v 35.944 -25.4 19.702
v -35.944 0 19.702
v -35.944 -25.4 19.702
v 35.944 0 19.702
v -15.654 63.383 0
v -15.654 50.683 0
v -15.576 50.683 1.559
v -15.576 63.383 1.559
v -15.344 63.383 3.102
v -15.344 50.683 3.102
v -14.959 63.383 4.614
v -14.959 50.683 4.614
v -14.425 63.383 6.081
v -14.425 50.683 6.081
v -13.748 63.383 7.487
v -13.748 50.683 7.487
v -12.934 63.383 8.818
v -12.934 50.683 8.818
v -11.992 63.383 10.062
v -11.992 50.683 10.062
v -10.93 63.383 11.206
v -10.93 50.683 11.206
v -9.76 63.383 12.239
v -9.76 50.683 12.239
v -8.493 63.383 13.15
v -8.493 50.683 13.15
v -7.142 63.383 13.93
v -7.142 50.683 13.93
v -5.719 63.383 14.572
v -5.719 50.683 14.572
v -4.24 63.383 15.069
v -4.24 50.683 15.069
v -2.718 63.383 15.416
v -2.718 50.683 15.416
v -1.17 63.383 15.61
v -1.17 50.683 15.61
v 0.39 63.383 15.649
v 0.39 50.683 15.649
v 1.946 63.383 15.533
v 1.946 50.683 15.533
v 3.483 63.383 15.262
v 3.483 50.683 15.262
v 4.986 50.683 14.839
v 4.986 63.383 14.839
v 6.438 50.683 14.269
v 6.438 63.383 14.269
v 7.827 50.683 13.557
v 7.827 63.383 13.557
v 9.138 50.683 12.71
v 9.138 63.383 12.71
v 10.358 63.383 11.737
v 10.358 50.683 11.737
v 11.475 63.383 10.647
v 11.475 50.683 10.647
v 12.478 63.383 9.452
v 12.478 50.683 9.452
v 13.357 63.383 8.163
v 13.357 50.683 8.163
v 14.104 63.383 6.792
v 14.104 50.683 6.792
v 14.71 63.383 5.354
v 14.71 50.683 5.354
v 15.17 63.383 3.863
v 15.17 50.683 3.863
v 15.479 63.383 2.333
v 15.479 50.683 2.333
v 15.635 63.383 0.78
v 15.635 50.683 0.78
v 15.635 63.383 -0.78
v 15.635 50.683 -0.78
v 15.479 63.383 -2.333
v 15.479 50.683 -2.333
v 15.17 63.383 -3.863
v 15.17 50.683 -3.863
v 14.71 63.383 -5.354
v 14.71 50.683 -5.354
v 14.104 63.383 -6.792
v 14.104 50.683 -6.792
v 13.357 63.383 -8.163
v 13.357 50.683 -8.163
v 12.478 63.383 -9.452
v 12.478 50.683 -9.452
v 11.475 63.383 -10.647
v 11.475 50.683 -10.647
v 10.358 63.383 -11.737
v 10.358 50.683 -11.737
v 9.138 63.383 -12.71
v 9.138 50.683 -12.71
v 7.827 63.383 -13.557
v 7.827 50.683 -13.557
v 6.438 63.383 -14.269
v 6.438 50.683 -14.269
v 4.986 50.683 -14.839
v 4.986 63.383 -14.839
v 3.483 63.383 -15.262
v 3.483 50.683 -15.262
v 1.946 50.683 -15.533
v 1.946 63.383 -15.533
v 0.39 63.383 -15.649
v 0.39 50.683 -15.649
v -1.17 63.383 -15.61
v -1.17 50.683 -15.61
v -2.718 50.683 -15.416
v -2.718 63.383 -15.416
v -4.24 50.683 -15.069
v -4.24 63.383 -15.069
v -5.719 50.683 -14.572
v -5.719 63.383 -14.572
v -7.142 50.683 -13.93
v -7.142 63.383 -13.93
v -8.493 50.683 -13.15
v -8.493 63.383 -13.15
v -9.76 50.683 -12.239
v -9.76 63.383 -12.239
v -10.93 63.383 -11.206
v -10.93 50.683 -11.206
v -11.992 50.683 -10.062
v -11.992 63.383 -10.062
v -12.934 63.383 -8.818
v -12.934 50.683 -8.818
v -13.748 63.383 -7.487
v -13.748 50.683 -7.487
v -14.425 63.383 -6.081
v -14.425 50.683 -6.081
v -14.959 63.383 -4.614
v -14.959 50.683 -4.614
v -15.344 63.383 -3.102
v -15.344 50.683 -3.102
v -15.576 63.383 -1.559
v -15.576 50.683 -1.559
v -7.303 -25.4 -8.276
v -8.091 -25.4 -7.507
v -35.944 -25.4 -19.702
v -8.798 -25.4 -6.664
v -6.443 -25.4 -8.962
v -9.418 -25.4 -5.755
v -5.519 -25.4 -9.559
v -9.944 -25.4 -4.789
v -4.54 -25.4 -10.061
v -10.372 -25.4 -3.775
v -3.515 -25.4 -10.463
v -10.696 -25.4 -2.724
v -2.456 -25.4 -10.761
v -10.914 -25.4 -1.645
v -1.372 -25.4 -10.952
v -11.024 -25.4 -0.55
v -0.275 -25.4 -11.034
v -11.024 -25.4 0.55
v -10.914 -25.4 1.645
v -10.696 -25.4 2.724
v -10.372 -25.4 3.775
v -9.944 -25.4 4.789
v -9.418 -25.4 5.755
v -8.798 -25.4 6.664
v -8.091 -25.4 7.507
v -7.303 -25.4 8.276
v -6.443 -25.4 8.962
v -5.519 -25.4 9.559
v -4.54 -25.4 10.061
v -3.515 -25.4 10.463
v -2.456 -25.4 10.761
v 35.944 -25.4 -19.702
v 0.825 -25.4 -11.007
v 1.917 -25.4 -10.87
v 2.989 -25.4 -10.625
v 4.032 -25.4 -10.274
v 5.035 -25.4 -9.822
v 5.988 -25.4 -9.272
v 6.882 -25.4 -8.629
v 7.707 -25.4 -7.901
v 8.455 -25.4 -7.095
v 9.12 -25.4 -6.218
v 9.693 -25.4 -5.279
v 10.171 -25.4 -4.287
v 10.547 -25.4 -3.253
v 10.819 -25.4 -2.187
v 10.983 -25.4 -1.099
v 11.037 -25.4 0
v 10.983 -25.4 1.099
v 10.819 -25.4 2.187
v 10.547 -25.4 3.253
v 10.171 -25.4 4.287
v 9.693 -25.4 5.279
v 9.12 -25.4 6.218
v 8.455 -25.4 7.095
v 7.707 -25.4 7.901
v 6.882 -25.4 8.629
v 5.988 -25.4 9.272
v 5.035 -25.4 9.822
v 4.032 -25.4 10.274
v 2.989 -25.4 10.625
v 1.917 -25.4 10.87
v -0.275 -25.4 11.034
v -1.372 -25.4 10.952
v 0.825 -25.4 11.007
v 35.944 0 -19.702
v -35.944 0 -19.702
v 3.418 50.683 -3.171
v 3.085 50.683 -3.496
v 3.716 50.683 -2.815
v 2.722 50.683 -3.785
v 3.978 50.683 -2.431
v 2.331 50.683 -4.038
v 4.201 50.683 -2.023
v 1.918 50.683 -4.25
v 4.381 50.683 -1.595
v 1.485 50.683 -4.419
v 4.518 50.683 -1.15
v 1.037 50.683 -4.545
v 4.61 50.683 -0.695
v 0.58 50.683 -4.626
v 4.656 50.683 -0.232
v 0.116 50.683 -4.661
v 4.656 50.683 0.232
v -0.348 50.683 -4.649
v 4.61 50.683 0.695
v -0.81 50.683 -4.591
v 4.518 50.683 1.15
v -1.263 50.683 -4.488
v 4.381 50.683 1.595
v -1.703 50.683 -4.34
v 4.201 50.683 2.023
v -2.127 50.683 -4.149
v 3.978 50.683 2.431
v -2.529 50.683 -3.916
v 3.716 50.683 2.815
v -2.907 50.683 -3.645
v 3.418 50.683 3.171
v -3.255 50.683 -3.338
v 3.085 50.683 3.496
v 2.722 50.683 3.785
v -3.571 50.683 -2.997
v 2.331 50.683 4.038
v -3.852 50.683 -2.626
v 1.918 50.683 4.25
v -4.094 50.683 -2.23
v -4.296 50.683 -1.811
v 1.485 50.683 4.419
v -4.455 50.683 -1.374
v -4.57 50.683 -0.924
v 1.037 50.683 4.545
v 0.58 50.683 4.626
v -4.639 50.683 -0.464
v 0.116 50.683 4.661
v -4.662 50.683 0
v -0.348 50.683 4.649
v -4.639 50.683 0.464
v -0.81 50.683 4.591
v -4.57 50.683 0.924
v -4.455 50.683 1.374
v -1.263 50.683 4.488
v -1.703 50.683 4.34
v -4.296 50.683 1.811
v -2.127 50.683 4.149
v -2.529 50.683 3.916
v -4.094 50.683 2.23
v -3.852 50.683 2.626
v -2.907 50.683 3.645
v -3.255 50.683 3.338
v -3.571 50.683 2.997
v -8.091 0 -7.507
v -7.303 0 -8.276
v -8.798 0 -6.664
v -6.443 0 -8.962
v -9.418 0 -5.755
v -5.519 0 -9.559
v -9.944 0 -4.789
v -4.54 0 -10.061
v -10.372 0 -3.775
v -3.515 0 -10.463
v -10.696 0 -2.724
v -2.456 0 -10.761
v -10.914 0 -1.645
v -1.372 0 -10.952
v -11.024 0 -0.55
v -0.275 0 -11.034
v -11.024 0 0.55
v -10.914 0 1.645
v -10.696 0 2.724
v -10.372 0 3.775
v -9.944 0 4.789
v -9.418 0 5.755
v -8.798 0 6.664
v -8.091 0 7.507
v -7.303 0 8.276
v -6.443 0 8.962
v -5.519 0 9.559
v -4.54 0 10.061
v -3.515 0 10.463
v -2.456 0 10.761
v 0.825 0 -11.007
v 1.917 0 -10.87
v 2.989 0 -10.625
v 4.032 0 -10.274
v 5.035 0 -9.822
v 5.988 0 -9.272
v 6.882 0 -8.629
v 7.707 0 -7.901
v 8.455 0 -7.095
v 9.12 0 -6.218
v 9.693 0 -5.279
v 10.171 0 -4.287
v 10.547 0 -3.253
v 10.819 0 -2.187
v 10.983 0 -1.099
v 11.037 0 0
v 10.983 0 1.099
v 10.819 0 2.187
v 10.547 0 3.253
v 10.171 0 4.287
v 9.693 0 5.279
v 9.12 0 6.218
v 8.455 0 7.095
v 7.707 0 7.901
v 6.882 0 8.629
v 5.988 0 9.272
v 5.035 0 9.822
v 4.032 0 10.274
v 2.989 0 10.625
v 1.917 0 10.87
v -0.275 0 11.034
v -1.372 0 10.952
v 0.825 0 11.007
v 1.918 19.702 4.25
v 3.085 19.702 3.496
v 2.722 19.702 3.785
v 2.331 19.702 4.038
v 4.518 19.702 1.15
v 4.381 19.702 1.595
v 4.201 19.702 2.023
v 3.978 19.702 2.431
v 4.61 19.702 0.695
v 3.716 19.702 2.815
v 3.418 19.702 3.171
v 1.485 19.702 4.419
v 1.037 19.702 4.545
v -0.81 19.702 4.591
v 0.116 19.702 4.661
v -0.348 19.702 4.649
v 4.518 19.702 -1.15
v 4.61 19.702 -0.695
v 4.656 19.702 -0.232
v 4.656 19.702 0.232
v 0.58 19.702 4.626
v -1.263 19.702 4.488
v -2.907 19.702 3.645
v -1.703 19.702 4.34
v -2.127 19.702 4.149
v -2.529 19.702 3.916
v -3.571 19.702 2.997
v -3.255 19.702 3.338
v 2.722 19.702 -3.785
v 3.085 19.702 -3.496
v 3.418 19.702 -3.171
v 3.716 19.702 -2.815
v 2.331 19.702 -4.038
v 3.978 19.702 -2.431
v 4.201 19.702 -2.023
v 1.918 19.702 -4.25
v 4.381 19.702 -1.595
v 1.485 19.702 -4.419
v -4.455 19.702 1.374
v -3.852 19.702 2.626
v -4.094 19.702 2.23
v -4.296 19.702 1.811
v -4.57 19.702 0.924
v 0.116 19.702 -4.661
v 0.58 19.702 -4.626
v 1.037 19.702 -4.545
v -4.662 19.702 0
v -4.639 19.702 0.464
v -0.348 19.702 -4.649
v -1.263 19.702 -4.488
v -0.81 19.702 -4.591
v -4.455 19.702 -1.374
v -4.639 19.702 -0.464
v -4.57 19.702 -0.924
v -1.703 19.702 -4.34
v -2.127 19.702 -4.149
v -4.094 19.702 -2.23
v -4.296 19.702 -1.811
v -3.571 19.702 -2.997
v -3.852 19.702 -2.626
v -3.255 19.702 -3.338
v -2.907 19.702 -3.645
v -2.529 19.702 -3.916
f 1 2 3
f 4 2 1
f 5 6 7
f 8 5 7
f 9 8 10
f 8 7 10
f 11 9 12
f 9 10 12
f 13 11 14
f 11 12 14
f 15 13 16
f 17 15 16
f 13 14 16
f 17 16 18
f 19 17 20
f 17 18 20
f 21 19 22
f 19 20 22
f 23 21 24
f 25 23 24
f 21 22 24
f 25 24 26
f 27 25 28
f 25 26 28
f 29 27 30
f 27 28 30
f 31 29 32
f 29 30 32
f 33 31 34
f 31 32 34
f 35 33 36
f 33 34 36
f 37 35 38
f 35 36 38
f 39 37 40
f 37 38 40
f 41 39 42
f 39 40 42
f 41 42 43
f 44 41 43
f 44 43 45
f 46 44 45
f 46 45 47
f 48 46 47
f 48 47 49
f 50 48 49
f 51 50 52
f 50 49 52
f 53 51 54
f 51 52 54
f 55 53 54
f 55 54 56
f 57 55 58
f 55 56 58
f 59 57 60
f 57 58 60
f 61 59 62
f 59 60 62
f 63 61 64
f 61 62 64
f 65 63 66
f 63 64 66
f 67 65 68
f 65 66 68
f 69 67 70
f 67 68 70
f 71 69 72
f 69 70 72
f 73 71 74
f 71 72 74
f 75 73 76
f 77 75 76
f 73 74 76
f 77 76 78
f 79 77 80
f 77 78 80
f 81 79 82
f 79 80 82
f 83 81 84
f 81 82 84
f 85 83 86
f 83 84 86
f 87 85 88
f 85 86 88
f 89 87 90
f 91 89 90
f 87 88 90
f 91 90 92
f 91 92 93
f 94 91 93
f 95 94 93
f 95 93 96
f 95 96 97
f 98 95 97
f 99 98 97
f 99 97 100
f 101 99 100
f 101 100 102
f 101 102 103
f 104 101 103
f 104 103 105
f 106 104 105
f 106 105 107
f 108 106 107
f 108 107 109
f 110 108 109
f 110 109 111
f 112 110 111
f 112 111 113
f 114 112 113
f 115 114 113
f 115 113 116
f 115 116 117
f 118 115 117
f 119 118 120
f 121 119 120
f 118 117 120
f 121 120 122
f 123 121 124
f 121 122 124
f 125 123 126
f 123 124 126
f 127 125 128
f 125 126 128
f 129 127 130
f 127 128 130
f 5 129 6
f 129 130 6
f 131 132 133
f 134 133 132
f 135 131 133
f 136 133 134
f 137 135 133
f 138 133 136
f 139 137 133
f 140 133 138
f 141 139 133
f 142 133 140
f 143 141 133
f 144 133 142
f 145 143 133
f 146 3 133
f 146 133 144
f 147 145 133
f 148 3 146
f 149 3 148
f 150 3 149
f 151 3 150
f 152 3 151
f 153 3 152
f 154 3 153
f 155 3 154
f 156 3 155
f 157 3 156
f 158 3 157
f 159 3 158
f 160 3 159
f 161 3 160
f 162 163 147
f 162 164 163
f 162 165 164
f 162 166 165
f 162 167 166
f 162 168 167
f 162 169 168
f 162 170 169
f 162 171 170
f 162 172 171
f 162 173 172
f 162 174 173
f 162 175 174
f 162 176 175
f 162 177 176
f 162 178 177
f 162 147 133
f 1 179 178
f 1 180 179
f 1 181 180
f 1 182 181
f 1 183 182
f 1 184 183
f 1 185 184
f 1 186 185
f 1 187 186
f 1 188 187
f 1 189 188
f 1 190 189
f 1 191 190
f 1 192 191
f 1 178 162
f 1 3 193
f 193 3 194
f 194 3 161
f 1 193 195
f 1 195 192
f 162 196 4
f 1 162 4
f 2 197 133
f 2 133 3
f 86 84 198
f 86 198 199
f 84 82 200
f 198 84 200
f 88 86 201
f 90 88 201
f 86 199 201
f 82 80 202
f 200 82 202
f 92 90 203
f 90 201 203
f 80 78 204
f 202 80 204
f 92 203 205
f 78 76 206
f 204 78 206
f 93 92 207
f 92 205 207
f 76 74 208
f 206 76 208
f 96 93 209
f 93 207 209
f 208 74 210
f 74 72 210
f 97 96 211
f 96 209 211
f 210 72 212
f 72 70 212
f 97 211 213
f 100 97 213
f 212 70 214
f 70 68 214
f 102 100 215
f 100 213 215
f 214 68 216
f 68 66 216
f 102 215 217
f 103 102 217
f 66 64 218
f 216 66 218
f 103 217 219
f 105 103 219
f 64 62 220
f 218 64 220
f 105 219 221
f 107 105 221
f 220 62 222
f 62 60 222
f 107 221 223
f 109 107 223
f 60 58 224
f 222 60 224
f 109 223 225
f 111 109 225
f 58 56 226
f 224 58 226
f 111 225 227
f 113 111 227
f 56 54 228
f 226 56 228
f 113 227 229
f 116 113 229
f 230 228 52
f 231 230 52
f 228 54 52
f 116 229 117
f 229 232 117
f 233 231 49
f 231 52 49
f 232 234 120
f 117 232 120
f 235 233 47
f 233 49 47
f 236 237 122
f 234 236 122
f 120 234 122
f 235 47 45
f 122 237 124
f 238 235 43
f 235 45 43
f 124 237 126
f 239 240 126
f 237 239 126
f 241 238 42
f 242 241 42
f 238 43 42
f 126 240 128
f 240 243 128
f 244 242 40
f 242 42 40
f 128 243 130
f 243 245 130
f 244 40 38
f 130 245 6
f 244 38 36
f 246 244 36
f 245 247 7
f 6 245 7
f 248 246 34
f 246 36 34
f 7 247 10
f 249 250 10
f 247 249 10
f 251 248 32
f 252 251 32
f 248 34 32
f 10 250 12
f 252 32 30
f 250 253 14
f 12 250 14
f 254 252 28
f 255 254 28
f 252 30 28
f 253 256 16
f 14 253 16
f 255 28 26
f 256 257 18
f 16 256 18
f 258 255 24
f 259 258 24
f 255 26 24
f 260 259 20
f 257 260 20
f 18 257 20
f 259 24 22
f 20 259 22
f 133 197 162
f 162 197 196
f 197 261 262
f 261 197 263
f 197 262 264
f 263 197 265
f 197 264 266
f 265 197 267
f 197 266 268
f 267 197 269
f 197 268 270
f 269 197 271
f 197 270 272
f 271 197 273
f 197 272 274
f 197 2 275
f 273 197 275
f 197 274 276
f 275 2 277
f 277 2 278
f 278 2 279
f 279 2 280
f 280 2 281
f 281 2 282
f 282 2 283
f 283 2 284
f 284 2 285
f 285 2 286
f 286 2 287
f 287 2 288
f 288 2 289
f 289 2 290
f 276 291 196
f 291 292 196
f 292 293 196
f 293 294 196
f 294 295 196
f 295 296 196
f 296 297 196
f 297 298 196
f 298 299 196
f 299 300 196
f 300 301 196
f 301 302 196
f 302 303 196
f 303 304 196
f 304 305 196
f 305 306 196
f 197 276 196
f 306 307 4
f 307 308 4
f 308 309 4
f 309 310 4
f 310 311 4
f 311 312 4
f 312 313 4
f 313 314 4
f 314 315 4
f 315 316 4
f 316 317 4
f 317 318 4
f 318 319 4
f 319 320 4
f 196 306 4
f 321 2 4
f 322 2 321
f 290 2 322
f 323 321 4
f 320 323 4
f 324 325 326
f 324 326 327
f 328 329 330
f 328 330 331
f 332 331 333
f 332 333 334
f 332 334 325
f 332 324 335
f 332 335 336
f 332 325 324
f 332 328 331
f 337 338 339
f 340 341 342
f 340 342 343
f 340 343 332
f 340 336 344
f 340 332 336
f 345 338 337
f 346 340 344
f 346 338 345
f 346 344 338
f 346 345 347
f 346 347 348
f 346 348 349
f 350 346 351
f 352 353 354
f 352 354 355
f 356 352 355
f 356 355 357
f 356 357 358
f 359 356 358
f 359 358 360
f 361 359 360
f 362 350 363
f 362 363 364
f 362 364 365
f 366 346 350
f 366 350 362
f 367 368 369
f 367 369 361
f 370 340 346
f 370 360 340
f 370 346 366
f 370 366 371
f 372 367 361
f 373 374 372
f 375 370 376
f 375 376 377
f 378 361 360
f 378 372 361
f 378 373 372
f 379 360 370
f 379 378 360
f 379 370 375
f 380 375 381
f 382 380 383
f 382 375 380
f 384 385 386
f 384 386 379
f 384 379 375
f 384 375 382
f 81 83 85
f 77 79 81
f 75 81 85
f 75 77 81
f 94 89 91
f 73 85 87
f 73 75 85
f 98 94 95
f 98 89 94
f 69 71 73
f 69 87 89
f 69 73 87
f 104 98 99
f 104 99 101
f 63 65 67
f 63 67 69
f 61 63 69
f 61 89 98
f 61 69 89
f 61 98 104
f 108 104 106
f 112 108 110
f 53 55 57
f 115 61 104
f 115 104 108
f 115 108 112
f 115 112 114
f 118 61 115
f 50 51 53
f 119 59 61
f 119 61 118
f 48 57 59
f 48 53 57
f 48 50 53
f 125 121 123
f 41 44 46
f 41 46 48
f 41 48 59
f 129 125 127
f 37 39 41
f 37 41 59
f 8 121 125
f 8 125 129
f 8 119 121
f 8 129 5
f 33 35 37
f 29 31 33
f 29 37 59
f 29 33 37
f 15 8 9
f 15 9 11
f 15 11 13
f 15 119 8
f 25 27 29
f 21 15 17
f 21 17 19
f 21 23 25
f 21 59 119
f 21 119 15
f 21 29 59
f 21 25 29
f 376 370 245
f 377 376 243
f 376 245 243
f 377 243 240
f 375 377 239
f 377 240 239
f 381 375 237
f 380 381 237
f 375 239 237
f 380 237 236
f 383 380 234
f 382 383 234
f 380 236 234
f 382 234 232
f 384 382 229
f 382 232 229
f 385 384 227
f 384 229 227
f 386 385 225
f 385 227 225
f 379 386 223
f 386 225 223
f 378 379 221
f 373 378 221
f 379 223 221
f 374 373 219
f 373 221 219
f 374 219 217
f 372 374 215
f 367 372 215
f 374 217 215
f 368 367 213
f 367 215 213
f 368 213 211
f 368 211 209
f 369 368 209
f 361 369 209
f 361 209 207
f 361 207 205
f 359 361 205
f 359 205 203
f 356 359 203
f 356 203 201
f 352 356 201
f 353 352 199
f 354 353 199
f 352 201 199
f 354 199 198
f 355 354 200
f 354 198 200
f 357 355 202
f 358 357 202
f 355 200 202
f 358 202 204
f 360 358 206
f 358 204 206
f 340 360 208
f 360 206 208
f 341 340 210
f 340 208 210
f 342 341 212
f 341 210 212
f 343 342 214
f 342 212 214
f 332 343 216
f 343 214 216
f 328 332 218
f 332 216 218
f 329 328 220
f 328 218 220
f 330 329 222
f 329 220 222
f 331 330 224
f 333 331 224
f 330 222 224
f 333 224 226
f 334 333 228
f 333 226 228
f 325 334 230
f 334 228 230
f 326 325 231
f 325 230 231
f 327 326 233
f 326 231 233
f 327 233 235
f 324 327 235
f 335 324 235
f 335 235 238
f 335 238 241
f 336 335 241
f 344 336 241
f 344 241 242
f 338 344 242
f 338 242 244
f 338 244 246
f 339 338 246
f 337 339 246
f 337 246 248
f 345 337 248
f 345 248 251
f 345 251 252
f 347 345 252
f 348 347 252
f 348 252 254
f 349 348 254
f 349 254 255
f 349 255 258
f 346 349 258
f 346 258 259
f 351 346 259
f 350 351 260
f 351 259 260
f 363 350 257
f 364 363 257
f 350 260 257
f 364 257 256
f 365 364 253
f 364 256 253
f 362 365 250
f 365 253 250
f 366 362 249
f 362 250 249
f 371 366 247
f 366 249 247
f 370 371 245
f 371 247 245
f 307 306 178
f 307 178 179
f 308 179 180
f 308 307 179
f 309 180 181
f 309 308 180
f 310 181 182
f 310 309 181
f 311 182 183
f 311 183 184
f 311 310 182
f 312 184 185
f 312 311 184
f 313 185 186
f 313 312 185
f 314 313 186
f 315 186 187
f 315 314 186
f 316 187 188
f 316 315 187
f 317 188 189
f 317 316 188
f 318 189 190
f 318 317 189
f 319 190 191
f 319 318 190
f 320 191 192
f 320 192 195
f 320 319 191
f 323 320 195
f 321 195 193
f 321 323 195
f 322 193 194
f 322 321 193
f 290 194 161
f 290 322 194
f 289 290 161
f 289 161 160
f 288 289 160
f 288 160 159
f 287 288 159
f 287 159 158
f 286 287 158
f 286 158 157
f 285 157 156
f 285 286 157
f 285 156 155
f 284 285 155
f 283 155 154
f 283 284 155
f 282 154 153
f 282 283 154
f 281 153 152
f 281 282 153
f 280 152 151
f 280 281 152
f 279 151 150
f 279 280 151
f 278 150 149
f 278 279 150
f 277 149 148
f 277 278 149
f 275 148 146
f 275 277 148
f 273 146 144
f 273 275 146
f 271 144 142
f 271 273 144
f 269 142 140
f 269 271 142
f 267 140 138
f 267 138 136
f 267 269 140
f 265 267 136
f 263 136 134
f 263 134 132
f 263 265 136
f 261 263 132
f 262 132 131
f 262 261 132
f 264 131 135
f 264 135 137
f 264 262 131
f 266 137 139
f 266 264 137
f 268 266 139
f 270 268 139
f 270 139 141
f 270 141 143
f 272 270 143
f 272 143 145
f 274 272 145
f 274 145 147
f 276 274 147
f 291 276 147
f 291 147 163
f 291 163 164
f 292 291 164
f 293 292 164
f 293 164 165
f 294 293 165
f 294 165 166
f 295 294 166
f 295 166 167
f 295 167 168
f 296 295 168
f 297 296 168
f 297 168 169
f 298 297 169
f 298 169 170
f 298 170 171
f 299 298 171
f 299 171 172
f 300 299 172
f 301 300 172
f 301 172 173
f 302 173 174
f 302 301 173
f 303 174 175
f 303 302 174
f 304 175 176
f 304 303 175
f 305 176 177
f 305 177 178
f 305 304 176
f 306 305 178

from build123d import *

# Parameters (mm, degrees)
F0_W     = 71.8886852264
F0_H     = 39.4034199417
F0_R     = 11.0373751876
F1_DEPTH = 25.4
F2_W     = 4.6622366644
F2_H     = 30.9813190252
F4_R     = 15.6540628249
F5_DEPTH = 12.7


with BuildPart() as f1:
    # F0 (on Front) → F1 (new body)
    with BuildSketch(Plane.XZ):
        Rectangle(F0_W, F0_H)
        Circle(F0_R, mode=Mode.SUBTRACT)
    extrude(amount=F1_DEPTH)


with BuildPart() as f3:
    # F2 (on Top) → F3 (revolve)
    with BuildSketch(Plane.XY):
        with Locations((-2.3311183322, 35.1923694834)):
            Rectangle(F2_W, F2_H)
    revolve(axis=Axis((0, 35.1923694834, 0), (0, -1, 0)))

    # F4 (on face) → F5 (join)
    with BuildSketch(Plane(origin=(0, 50.683028996, 0), x_dir=(-1, 0, 0), z_dir=(0, 1, 0))):
        Circle(F4_R)
    extrude(amount=F5_DEPTH)


solid = Compound([f1.part, f3.part])
